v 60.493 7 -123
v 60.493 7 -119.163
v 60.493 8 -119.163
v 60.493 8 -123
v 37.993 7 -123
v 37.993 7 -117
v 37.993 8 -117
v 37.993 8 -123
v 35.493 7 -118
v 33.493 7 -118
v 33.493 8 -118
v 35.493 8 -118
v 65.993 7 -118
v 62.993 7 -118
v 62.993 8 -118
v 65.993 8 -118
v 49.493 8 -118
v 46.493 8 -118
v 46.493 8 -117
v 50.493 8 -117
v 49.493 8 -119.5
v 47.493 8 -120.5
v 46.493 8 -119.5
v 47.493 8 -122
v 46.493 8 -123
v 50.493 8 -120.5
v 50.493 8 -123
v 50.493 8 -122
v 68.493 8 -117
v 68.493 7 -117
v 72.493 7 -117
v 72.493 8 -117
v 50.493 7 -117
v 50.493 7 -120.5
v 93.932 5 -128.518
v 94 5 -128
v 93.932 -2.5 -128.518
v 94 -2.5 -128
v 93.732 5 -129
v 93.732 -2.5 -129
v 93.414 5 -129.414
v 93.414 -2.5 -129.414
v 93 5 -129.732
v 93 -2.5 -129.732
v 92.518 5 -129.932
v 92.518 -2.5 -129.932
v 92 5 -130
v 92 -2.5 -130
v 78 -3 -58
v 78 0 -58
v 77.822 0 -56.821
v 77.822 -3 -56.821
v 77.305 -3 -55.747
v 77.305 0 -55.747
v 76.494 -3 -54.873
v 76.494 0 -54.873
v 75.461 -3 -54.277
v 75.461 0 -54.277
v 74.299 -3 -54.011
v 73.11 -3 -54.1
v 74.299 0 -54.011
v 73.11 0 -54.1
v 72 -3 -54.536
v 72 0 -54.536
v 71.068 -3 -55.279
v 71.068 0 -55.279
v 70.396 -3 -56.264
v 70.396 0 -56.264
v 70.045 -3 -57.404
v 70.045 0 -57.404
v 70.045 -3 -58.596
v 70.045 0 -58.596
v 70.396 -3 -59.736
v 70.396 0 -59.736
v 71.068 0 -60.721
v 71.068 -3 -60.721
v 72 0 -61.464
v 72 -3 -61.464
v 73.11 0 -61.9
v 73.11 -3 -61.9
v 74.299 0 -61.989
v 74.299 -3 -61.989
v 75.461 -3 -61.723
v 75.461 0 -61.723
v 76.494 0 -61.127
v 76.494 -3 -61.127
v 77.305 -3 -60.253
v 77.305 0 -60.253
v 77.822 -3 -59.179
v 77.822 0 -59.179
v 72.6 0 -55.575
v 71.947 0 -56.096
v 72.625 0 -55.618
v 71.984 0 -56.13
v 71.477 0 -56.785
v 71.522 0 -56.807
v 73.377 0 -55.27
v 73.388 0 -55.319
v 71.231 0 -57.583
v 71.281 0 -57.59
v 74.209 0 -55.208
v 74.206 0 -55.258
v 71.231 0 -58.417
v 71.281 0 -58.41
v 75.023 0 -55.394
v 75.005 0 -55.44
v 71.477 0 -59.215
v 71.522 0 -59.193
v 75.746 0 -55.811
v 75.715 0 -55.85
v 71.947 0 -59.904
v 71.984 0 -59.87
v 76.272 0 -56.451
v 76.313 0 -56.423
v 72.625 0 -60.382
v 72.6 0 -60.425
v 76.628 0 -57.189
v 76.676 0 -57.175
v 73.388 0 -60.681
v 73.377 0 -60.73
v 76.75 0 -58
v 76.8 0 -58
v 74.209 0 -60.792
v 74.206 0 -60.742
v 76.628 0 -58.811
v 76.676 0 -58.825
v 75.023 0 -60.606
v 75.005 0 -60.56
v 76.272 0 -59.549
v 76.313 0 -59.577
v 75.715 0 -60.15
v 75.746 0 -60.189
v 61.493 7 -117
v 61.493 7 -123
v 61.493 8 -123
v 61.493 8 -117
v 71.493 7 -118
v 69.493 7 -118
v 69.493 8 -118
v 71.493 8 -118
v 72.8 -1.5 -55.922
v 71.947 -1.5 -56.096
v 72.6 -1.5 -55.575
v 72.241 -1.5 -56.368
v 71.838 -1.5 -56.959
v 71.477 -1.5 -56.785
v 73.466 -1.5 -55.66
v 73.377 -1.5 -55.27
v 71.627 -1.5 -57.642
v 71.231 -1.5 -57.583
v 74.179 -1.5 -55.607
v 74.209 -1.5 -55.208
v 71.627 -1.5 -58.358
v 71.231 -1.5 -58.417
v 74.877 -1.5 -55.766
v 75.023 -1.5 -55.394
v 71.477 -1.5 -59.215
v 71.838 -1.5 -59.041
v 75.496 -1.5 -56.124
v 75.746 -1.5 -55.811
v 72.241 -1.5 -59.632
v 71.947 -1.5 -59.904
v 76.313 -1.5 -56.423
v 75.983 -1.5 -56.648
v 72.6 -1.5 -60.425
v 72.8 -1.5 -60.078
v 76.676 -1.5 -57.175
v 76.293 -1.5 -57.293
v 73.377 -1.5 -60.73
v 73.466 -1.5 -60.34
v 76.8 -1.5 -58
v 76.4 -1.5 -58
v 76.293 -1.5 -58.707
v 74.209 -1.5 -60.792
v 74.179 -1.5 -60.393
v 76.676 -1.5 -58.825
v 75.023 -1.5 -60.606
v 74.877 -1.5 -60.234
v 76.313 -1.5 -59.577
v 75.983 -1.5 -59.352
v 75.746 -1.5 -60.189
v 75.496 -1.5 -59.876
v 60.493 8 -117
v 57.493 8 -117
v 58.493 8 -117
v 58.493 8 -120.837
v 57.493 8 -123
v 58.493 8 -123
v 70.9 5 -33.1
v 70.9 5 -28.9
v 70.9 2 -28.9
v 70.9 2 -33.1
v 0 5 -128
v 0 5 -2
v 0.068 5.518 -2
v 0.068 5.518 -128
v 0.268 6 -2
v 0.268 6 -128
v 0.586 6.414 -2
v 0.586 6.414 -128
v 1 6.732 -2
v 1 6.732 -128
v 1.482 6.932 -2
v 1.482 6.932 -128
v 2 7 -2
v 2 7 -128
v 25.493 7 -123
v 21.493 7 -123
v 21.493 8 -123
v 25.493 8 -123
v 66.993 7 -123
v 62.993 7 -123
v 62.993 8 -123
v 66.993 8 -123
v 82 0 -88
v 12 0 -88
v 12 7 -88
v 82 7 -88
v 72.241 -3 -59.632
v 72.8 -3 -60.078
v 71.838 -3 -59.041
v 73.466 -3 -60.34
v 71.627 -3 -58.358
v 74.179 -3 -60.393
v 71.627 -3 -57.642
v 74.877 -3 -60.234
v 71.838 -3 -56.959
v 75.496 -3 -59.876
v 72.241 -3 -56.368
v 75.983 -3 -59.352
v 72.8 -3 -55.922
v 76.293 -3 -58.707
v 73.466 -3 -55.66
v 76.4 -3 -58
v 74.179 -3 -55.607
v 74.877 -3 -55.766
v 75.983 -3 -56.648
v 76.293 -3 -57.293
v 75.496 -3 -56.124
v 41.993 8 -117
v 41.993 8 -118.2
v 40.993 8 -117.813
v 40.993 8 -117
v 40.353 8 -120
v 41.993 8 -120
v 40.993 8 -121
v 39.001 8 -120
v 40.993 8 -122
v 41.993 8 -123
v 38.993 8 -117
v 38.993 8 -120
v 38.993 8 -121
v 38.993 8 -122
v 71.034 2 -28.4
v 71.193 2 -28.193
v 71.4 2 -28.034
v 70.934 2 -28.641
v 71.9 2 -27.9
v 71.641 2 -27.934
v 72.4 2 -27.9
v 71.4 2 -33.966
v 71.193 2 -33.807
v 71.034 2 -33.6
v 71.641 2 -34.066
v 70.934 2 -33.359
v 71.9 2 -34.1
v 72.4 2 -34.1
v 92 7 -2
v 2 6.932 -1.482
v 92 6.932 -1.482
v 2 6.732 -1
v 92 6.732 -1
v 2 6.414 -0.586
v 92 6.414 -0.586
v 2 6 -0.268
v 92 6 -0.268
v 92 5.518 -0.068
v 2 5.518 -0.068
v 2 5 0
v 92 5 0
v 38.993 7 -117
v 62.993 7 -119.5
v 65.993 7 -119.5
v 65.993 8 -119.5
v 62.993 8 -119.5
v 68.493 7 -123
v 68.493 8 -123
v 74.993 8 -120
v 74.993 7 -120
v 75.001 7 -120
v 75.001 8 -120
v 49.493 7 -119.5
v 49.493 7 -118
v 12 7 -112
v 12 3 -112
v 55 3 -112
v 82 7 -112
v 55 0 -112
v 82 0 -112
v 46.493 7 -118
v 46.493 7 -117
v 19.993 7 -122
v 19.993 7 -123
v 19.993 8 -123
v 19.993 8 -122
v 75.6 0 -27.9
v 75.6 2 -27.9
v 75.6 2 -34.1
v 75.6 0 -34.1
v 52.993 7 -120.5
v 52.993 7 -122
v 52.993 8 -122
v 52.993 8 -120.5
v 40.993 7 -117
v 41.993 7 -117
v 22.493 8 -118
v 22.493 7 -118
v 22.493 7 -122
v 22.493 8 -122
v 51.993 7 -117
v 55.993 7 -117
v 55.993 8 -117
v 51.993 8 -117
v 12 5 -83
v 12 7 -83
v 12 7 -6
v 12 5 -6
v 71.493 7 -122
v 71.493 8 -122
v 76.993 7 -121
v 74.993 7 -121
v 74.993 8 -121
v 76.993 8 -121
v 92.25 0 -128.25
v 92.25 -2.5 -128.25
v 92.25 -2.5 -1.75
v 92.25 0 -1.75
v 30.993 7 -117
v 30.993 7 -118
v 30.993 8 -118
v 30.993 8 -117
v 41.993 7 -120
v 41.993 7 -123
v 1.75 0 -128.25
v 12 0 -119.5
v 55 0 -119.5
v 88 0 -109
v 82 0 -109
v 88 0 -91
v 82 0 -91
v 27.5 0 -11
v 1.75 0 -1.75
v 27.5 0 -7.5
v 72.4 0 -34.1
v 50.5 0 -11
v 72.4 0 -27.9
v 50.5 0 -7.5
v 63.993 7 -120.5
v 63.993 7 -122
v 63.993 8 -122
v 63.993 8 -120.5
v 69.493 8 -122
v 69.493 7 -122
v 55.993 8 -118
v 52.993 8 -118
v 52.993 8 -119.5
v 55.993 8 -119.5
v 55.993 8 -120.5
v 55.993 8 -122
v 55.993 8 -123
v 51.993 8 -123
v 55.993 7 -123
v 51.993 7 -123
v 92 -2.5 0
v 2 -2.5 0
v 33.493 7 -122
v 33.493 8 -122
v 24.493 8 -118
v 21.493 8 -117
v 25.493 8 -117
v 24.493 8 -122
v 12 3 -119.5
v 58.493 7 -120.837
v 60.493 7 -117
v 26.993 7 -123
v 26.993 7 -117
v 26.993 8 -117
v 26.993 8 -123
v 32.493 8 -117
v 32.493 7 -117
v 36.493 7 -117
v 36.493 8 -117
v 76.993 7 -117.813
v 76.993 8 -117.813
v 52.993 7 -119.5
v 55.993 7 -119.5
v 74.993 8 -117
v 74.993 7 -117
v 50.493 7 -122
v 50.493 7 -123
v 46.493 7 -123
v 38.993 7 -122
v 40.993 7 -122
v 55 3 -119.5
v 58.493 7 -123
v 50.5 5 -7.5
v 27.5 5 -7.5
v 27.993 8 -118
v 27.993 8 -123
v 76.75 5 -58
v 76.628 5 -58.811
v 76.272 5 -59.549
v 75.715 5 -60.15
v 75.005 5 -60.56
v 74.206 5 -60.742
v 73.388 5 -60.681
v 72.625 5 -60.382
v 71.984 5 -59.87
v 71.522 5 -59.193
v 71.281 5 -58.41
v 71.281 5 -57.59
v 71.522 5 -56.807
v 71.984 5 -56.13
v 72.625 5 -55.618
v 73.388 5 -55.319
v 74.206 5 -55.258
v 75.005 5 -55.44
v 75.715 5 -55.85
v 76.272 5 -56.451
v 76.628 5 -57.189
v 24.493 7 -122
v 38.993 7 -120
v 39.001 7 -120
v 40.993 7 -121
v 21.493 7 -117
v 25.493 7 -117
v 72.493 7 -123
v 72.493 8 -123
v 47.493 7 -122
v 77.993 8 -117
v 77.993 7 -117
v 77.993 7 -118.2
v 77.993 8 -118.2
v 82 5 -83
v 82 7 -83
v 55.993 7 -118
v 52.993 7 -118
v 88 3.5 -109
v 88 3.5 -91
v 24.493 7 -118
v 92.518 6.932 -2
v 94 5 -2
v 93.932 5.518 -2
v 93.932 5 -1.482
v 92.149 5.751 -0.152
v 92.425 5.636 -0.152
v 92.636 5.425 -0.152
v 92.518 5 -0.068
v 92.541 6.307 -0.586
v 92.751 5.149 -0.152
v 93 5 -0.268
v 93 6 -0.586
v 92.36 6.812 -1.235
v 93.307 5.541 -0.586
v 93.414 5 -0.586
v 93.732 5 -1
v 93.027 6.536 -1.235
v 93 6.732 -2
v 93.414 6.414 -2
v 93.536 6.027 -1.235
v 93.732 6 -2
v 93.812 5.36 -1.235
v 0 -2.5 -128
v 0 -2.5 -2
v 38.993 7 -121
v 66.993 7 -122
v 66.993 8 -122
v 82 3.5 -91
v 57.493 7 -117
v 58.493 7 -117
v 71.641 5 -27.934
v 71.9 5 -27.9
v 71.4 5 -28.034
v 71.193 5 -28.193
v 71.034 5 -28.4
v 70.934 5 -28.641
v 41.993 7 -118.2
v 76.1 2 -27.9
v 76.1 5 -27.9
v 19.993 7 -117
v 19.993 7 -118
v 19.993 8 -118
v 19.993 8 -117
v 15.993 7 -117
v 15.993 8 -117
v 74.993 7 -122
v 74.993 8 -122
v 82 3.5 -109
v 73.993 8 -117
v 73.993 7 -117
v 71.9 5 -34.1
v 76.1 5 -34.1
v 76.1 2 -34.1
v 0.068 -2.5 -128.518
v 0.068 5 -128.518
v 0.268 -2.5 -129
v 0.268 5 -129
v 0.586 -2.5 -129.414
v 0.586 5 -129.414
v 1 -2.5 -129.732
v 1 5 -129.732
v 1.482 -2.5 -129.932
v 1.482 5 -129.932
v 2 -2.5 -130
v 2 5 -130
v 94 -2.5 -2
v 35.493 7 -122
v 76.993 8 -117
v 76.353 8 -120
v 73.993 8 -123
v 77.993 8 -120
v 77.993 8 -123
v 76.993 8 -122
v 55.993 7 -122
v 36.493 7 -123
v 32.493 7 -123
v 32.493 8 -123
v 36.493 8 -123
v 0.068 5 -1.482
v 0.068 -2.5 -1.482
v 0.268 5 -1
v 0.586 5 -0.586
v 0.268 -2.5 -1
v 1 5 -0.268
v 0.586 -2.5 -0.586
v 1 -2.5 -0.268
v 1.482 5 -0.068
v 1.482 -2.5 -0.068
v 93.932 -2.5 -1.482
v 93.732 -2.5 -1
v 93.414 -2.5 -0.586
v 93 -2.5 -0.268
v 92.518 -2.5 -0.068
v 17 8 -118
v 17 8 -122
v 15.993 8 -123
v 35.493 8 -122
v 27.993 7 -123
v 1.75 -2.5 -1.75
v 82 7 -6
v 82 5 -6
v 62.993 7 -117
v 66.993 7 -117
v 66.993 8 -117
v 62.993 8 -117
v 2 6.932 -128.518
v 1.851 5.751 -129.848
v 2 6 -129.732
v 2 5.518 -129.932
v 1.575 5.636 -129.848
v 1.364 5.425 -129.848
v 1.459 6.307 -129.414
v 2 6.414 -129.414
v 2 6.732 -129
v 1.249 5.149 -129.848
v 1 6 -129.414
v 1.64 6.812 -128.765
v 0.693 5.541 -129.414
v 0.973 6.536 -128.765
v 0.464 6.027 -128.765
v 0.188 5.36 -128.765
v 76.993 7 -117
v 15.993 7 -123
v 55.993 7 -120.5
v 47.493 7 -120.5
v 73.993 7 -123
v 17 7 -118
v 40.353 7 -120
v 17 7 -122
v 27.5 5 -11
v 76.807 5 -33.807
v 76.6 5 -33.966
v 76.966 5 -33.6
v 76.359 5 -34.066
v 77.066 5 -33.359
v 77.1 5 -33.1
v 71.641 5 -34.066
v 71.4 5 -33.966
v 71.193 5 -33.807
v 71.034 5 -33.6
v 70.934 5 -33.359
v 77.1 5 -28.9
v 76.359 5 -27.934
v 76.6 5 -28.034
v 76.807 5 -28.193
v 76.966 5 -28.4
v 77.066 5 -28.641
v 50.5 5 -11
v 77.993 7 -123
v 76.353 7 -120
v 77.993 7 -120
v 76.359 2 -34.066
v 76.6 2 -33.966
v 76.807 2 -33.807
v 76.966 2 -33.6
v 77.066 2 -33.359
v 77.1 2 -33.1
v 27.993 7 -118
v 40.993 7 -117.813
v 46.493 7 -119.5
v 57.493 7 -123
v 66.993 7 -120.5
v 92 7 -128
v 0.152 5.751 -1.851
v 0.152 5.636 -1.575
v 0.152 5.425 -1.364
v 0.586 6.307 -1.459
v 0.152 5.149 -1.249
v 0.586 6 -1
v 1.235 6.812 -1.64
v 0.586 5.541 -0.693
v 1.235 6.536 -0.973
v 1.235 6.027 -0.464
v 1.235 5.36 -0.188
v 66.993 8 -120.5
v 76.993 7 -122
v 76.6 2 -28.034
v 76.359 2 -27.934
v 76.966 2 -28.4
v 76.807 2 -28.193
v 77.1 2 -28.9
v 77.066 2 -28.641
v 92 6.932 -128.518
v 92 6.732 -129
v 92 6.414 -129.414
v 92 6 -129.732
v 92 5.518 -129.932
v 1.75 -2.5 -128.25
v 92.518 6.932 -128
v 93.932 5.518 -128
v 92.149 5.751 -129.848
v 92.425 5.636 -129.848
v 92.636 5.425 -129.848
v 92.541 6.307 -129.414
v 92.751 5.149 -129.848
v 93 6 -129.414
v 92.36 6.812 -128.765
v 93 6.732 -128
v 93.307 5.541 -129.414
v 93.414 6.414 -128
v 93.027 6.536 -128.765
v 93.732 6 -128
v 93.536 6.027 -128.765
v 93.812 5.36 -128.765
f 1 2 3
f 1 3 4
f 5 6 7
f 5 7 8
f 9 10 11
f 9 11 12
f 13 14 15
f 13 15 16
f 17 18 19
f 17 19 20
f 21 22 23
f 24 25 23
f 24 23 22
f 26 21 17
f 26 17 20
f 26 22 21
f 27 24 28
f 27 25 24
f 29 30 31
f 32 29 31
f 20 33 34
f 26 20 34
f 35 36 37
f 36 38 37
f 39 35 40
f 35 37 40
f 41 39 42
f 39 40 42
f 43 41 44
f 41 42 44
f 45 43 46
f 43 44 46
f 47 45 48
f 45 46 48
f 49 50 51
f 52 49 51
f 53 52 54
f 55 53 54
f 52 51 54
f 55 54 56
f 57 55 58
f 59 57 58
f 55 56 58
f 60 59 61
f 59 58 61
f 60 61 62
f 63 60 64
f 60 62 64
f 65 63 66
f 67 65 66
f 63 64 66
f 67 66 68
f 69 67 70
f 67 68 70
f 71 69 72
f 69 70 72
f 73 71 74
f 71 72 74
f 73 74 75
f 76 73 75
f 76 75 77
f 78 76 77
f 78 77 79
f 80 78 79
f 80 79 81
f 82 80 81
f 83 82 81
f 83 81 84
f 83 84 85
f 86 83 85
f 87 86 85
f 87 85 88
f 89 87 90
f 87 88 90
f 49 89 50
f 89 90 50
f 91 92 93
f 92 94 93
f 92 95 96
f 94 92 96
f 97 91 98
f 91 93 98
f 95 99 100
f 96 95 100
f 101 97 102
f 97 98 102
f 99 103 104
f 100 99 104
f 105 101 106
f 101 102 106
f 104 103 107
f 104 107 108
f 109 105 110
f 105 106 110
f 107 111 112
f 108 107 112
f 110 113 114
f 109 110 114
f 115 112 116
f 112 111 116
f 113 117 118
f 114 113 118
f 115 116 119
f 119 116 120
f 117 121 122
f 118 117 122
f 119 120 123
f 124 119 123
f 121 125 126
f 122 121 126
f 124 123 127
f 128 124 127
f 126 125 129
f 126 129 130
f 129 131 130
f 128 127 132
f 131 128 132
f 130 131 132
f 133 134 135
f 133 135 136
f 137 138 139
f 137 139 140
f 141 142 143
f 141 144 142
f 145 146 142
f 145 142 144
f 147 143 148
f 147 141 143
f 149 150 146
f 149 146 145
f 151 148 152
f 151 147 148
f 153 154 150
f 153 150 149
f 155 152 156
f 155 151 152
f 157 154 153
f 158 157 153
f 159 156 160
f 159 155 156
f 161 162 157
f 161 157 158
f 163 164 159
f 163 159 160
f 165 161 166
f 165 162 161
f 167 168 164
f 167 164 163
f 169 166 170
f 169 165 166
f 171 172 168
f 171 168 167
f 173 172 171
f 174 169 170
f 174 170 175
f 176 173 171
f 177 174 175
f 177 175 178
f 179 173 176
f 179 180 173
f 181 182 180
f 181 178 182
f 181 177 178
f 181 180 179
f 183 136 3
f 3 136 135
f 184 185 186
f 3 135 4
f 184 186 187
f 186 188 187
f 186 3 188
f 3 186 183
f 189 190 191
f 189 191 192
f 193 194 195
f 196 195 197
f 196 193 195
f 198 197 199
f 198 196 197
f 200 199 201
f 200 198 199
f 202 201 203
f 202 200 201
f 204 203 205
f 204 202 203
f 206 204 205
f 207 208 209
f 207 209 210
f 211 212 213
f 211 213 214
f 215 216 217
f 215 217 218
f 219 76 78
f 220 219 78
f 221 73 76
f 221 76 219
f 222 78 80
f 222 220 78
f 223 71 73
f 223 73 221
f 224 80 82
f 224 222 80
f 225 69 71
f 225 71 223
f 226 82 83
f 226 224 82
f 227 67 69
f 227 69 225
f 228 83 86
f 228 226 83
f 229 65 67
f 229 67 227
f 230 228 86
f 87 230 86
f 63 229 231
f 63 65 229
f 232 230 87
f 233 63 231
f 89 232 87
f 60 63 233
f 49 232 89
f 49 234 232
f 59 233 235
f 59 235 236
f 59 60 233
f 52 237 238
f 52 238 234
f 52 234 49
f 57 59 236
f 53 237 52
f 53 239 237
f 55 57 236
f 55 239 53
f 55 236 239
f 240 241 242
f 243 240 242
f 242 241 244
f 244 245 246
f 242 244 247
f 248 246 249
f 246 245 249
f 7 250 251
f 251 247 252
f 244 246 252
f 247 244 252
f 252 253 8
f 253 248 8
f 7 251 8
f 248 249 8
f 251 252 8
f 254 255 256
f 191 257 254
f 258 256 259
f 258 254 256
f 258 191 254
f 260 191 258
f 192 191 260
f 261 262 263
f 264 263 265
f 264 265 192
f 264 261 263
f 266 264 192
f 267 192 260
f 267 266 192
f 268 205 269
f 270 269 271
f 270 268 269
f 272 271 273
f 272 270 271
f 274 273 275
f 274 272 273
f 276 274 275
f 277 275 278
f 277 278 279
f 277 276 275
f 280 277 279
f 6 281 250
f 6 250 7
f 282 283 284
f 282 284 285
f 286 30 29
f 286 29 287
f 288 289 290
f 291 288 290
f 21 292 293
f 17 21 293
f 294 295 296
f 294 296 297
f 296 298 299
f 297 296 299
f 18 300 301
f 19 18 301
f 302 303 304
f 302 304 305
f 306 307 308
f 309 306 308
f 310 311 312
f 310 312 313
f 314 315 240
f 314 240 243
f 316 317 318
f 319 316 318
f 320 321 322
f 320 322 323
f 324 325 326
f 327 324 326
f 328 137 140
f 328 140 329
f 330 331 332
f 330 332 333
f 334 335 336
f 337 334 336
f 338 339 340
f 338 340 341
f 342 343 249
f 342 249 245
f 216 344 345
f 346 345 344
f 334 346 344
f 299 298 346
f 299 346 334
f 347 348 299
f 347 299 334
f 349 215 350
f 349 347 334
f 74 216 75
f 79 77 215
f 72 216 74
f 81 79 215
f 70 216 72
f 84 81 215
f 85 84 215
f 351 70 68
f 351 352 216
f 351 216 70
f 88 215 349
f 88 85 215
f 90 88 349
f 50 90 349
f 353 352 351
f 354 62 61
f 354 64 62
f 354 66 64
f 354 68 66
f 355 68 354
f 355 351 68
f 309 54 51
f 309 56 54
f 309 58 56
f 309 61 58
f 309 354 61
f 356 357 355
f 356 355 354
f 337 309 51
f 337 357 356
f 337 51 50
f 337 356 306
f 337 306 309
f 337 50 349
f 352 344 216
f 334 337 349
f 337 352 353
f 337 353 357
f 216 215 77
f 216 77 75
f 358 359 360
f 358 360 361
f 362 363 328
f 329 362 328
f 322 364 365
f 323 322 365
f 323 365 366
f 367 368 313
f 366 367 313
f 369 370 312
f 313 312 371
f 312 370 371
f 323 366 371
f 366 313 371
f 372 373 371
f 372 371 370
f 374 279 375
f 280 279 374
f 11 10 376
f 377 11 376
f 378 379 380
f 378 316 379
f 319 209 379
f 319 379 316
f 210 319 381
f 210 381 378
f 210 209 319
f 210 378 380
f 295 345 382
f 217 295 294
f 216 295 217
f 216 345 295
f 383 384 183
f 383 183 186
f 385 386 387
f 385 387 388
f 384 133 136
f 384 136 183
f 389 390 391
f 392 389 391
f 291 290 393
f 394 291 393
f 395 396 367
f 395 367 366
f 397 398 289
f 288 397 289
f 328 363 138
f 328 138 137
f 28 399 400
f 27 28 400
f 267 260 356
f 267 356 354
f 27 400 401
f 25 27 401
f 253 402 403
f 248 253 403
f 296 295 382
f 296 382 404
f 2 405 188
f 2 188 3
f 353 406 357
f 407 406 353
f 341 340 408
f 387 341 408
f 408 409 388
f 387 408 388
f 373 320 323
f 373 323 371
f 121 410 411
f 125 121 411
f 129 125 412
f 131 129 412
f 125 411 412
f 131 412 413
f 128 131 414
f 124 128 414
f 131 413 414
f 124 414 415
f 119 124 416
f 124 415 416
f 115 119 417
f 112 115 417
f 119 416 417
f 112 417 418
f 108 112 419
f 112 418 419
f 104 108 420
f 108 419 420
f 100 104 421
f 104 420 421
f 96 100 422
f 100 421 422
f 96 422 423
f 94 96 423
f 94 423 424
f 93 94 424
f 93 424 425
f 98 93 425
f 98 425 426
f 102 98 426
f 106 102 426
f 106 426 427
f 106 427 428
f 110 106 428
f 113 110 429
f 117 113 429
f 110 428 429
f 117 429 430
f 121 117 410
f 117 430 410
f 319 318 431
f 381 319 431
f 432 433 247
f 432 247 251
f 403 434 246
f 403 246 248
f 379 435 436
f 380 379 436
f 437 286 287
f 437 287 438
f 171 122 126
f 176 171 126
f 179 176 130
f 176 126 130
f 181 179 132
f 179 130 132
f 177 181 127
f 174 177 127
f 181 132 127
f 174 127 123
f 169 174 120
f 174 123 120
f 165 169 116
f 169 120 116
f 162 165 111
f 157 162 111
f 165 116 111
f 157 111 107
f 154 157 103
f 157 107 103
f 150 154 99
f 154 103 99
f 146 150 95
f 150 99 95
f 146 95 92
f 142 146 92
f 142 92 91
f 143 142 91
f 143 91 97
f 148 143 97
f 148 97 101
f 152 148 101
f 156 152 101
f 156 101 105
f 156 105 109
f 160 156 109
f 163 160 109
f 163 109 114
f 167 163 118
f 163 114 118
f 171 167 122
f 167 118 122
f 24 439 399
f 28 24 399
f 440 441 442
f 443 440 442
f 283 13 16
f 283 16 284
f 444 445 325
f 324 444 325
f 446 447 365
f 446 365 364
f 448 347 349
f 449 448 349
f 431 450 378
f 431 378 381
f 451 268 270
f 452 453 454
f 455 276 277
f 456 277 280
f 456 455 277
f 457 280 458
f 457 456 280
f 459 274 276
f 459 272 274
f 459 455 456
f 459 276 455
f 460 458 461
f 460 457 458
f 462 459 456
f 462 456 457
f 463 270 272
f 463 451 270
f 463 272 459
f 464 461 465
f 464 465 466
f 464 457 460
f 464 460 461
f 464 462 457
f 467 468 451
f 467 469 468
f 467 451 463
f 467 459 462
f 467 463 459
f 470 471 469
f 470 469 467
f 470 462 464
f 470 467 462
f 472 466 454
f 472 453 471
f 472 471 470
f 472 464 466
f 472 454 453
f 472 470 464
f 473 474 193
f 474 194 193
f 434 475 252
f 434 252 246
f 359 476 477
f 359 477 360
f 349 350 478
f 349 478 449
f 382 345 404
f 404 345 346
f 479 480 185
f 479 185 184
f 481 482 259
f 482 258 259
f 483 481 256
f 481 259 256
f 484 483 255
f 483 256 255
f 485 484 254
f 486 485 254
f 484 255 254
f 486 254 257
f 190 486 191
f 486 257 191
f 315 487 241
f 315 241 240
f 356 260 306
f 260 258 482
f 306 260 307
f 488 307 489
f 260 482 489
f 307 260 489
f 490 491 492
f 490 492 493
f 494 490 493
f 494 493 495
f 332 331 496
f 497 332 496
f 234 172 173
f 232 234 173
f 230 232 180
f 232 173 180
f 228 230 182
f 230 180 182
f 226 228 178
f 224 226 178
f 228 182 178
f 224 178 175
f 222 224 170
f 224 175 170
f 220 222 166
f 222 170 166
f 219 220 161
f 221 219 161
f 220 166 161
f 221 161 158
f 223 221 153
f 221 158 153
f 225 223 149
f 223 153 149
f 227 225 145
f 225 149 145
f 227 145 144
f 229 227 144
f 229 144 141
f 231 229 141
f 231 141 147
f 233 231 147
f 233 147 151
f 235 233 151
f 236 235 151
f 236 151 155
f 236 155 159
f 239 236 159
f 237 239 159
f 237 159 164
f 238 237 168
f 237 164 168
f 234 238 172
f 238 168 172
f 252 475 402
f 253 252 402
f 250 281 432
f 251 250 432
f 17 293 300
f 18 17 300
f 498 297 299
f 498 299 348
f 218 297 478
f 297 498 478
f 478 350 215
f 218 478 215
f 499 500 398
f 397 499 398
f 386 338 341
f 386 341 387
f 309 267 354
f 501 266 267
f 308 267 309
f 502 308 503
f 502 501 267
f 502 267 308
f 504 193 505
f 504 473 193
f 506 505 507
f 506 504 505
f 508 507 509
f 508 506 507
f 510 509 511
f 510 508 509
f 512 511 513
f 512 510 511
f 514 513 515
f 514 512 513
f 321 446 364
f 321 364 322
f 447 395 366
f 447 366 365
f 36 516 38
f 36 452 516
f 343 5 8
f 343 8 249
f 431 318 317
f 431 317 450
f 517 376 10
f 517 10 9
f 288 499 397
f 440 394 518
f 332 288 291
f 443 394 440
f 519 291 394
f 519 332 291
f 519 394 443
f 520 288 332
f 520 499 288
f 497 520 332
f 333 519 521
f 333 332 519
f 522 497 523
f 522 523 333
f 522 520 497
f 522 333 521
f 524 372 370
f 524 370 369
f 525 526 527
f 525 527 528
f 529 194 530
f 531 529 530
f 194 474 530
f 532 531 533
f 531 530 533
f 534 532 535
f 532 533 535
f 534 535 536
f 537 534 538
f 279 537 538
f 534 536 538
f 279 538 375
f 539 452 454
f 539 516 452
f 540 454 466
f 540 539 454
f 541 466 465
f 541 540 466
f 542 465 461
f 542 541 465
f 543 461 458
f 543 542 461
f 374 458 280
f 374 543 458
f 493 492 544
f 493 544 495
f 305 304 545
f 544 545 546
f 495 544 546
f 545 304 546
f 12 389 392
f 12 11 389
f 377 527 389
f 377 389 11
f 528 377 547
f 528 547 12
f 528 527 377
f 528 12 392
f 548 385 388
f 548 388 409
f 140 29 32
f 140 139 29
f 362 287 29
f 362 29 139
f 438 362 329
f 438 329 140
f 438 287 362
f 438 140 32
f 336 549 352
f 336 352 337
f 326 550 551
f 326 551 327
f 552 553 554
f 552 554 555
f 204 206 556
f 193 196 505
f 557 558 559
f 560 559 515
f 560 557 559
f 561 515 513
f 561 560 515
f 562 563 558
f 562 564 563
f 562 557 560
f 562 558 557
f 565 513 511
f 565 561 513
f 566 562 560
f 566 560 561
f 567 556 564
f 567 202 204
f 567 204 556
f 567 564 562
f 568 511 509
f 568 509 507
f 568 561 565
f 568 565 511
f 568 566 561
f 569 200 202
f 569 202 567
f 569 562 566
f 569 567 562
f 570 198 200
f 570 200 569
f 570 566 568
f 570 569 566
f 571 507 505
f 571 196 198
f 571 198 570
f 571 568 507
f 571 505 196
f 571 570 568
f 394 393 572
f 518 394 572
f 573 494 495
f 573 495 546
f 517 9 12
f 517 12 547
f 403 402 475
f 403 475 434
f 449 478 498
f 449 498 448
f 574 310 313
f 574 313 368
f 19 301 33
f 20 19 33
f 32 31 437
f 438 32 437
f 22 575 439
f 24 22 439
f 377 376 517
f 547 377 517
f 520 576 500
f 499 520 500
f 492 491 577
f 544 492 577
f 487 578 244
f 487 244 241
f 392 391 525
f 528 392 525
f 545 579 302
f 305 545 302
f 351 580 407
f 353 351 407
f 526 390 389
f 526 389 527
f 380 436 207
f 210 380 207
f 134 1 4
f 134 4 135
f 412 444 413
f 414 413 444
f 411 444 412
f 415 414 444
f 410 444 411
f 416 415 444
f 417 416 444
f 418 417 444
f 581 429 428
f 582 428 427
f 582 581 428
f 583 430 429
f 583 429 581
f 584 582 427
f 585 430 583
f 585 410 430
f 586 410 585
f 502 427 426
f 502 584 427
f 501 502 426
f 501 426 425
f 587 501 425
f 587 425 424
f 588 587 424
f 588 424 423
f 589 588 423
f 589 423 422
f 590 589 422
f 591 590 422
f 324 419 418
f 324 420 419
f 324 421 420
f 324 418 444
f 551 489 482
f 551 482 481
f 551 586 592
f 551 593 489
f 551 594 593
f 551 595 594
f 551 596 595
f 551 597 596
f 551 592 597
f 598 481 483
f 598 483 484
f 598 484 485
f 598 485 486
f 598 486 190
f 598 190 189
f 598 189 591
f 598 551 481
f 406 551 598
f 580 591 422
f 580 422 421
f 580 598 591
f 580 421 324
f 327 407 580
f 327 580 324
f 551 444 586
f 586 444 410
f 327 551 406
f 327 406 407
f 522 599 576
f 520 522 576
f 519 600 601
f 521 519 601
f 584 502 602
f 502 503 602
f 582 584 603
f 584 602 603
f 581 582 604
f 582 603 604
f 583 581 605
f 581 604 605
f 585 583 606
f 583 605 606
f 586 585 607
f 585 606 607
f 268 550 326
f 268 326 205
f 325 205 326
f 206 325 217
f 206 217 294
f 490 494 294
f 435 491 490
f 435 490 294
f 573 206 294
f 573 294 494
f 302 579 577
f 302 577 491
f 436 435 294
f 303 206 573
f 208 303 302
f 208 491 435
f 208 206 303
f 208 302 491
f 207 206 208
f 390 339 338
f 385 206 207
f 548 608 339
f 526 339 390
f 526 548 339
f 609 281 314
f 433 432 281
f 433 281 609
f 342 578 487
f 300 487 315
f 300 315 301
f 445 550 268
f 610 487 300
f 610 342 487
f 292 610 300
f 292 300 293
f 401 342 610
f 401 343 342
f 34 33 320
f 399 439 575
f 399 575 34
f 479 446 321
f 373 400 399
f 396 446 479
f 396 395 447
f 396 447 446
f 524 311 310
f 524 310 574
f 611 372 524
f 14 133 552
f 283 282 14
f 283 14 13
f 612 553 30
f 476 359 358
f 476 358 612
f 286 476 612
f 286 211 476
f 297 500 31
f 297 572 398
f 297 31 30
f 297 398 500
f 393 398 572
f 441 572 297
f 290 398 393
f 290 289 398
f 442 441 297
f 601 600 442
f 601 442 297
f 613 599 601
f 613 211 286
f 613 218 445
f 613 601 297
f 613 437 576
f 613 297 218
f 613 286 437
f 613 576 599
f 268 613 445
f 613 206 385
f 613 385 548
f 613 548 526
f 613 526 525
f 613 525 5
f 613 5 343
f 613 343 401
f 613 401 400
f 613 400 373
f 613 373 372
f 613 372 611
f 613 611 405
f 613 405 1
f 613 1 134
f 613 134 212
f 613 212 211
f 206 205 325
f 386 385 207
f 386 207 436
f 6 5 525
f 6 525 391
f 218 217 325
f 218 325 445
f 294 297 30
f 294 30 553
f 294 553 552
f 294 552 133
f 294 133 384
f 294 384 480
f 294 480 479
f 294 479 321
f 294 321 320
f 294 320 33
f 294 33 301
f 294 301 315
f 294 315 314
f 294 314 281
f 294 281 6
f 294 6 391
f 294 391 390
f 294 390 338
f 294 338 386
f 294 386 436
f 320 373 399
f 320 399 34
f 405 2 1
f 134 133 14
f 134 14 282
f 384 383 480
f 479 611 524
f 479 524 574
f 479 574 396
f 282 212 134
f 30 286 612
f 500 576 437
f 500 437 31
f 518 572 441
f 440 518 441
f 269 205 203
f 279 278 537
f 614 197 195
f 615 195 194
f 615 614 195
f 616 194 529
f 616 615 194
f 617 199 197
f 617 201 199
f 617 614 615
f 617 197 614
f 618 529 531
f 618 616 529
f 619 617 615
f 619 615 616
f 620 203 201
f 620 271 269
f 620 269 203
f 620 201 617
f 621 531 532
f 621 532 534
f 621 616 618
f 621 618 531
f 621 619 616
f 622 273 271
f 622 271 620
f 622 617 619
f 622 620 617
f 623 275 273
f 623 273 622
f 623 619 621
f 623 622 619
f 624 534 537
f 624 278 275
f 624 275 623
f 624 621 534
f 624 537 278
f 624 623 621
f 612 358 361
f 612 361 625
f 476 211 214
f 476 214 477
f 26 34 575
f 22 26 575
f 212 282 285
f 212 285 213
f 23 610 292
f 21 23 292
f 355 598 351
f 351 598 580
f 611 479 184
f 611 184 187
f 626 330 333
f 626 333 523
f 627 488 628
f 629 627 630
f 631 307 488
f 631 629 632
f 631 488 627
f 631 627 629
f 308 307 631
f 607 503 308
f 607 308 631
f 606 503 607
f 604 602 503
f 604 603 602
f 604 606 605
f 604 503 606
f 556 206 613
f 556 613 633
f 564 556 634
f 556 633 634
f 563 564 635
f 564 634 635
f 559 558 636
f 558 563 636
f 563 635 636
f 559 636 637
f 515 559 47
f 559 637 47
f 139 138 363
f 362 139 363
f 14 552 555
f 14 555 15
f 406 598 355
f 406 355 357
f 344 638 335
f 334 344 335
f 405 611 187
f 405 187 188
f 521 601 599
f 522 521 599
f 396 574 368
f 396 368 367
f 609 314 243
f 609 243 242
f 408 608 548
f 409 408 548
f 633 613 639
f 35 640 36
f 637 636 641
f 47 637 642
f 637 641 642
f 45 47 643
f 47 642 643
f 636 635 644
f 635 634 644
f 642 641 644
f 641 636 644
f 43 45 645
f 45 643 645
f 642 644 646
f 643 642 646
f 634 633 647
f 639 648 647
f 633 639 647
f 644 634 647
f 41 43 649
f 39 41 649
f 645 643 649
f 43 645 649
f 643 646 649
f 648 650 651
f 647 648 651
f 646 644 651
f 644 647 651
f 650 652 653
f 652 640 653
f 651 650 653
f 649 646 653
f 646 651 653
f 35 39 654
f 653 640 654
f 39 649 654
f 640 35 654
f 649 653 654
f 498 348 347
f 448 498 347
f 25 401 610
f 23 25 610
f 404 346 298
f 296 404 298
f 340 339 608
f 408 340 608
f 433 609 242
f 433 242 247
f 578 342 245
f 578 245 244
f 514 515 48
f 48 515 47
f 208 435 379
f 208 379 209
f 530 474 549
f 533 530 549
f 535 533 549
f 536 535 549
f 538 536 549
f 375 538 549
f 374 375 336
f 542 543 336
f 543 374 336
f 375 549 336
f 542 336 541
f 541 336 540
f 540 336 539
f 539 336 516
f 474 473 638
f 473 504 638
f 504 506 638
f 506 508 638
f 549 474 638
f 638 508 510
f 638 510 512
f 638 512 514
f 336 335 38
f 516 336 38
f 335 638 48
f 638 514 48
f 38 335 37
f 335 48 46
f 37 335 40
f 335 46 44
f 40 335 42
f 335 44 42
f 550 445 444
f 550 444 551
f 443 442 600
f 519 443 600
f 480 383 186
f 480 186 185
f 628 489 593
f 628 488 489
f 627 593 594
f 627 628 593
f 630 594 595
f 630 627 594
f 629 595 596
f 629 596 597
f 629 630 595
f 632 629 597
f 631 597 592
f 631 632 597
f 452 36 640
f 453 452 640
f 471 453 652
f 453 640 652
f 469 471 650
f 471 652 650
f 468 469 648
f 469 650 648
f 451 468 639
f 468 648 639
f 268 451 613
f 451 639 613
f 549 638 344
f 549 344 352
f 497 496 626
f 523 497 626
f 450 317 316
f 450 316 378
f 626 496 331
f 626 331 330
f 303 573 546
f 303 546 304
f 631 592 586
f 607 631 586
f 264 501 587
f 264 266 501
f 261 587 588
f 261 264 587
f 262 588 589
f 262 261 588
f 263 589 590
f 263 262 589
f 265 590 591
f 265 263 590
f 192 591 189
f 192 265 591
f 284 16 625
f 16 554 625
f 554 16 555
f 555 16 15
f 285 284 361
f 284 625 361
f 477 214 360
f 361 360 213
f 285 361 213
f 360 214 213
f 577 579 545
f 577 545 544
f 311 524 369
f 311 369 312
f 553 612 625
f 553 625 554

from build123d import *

# Parameters (mm, degrees)
SKETCH1_W                = 94
SKETCH1_H                = 130
BOSS_EXTRUDE1_DEPTH      = 9.5
SKETCH2_W                = 90.5
SKETCH2_H                = 126.5
CUT_EXTRUDE1_DEPTH       = 2.5
SKETCH3_W                = 70
SKETCH3_H                = 24
CUT_EXTRUDE2_DEPTH       = 8
SKETCH4_W                = 70
SKETCH4_H                = 77
CUT_EXTRUDE3_DEPTH       = 2
SKETCH5_W                = 23
SKETCH5_H                = 3.5
CUT_EXTRUDE4_DEPTH       = 8.5
SKETCH6_W                = 6
SKETCH6_H                = 18
CUT_EXTRUDE5_DEPTH       = 3.5
SKETCH7_W                = 43
SKETCH7_H                = 7.5
CUT_EXTRUDE6_DEPTH       = 3
FILLET1_R                = 2
SKETCH9_R                = 2.75
CUT_EXTRUDE7_DEPTH       = 5
SKETCH12_W               = 6.2
SKETCH12_H               = 6.2
CUT_EXTRUDE9_DEPTH       = 3
SKETCH13_W               = 3.2
SKETCH13_H               = 6.2
CUT_EXTRUDE10_DEPTH      = 6
CUT_EXTRUDE10_DEPTH_BACK = 5.5
FILLET2_R                = 1
SKETCH14_R               = 4
BOSS_EXTRUDE2_DEPTH      = 3
SKETCH15_R               = 2.8
CUT_EXTRUDE11_DEPTH      = 1.5
SKETCH16_R               = 2.4
CUT_EXTRUDE12_DEPTH      = 1.5
SKETCH18_W               = 4
SKETCH18_H               = 6
SKETCH18_W_2             = 2
SKETCH18_H_2             = 4
SKETCH18_H_3             = 1
BOSS_EXTRUDE3_DEPTH      = 1


with BuildPart() as part:
    # Sketch1 → Boss-Extrude1 (new body)
    with BuildSketch(Plane(origin=(0, 7, 0), x_dir=(1, 0, 0), z_dir=(0, 1, 0))):
        with Locations((47, 65)):
            Rectangle(SKETCH1_W, SKETCH1_H)
    extrude(amount=-BOSS_EXTRUDE1_DEPTH)

    # Sketch2 → Cut-Extrude1 (cut)
    with BuildSketch(Plane.XZ.offset(2.5)):
        with Locations((47, -65)):
            Rectangle(SKETCH2_W, SKETCH2_H)
    extrude(amount=-CUT_EXTRUDE1_DEPTH, mode=Mode.SUBTRACT)

    # Sketch3 → Cut-Extrude2 (cut, through all)
    with BuildSketch(Plane.XZ):
        with Locations((47, -100)):
            Rectangle(SKETCH3_W, SKETCH3_H)
    extrude(amount=-CUT_EXTRUDE2_DEPTH, mode=Mode.SUBTRACT)

    # Sketch4 → Cut-Extrude3 (cut)
    with BuildSketch(Plane(origin=(0, 7, 0), x_dir=(-1, 0, 0), z_dir=(0, 1, 0))):
        with Locations((-47, -44.5)):
            Rectangle(SKETCH4_W, SKETCH4_H)
    extrude(amount=-CUT_EXTRUDE3_DEPTH, mode=Mode.SUBTRACT)

    # Sketch5 → Cut-Extrude4 (cut, through all)
    with BuildSketch(Plane(origin=(0, 5, 0), x_dir=(-1, 0, 0), z_dir=(0, 1, 0))):
        with Locations((-39, -9.25)):
            Rectangle(SKETCH5_W, SKETCH5_H)
    extrude(amount=-CUT_EXTRUDE4_DEPTH, mode=Mode.SUBTRACT)

    # Sketch6 → Cut-Extrude5 (cut)
    with BuildSketch(Plane.XZ):
        with Locations((85, -100)):
            Rectangle(SKETCH6_W, SKETCH6_H)
    extrude(amount=-CUT_EXTRUDE5_DEPTH, mode=Mode.SUBTRACT)

    # Sketch7 → Cut-Extrude6 (cut)
    with BuildSketch(Plane.XZ):
        with Locations((33.5, -115.75)):
            Rectangle(SKETCH7_W, SKETCH7_H)
    extrude(amount=-CUT_EXTRUDE6_DEPTH, mode=Mode.SUBTRACT)

    # Fillet1
    fillet1_edges = [part.edges().sort_by_distance(p)[0] for p in [
        (94, 7, -65),
        (47, 7, 0),
        (0, 7, -65),
        (47, 7, -130),
        (94, 2.25, -130),
        (94, 2.25, 0),
        (0, 2.25, 0),
        (0, 2.25, -130),
    ]]
    fillet(fillet1_edges, radius=FILLET1_R)

    # Sketch9 → Cut-Extrude7 (cut)
    with BuildSketch(Plane(origin=(0, 5, 0), x_dir=(1, 0, 0), z_dir=(0, 1, 0))):
        with Locations((74, 58)):
            Circle(SKETCH9_R)
    extrude(amount=-CUT_EXTRUDE7_DEPTH, mode=Mode.SUBTRACT)

    # Sketch12 → Cut-Extrude9 (cut)
    with BuildSketch(Plane(origin=(0, 5, 0), x_dir=(1, 0, 0), z_dir=(0, 1, 0))):
        with Locations((74, 31)):
            Rectangle(SKETCH12_W, SKETCH12_H)
    extrude(amount=-CUT_EXTRUDE9_DEPTH, mode=Mode.SUBTRACT)

    # Sketch13 → Cut-Extrude10 (cut, two sides)
    with BuildSketch(Plane(origin=(0, 2, 0), x_dir=(1, 0, 0), z_dir=(0, 1, 0))) as cut_extrude10_sk:
        with Locations((74, 31)):
            Rectangle(SKETCH13_W, SKETCH13_H)
    extrude(amount=CUT_EXTRUDE10_DEPTH, mode=Mode.SUBTRACT)
    extrude(cut_extrude10_sk.sketch, amount=-CUT_EXTRUDE10_DEPTH_BACK, mode=Mode.SUBTRACT)

    # Fillet2
    fillet2_edges = [part.edges().sort_by_distance(p)[0] for p in [
        (77.1, 3.5, -34.1),
        (77.1, 3.5, -27.9),
        (70.9, 3.5, -27.9),
        (70.9, 3.5, -34.1),
    ]]
    fillet(fillet2_edges, radius=FILLET2_R)

    # Sketch14 → Boss-Extrude2 (add)
    with BuildSketch(Plane.XZ):
        with Locations((74, -58)):
            Circle(SKETCH14_R)
    extrude(amount=BOSS_EXTRUDE2_DEPTH)

    # Sketch15 → Cut-Extrude11 (cut)
    with BuildSketch(Plane(origin=(0, 0, 0), x_dir=(1, 0, 0), z_dir=(0, 1, 0))):
        with Locations((74, 58)):
            Circle(SKETCH15_R)
    extrude(amount=-CUT_EXTRUDE11_DEPTH, mode=Mode.SUBTRACT)

    # Sketch16 → Cut-Extrude12 (cut)
    with BuildSketch(Plane(origin=(0, -1.5, 0), x_dir=(1, 0, 0), z_dir=(0, 1, 0))):
        with Locations((74, 58)):
            Circle(SKETCH16_R)
    extrude(amount=-CUT_EXTRUDE12_DEPTH, mode=Mode.SUBTRACT)

    # Sketch18 → Boss-Extrude3 (add)
    with BuildSketch(Plane(origin=(0, 7, 0), x_dir=(1, 0, 0), z_dir=(0, 1, 0))):
        Polygon((17, 122), (17, 118), (19, 118), (19.993343468, 118), (19.993343468, 117), (15.993343468, 117), (15.993343468, 123), (19.993343468, 123), (19.993343468, 122), (19, 122), align=None)
        Polygon((66.993343468, 122), (63.993343468, 122), (63.993343468, 120.5), (66.993343468, 120.5), (66.993343468, 117), (62.993343468, 117), (62.993343468, 118), (65.993343468, 118), (65.993343468, 119.5), (62.993343468, 119.5), (62.993343468, 123), (66.993343468, 123), align=None)
        with Locations((23.493343468, 120)):
            Rectangle(SKETCH18_W, SKETCH18_H)
        with Locations((23.493343468, 120)):
            Rectangle(SKETCH18_W_2, SKETCH18_H_2, mode=Mode.SUBTRACT)
        Polygon((27.993343468, 122), (27.993343468, 118), (29.109404955, 118), (30.993343468, 118), (30.993343468, 117), (26.993343468, 117), (26.993343468, 123), (27.993343468, 123), align=None)
        with Locations((34.493343468, 120)):
            Rectangle(SKETCH18_W, SKETCH18_H)
        with Locations((34.493343468, 120)):
            Rectangle(SKETCH18_W_2, SKETCH18_H_2, mode=Mode.SUBTRACT)
        Polygon((49.493343468, 122), (50.493343468, 122), (50.493343468, 123), (46.493343468, 123), (46.493343468, 119.5), (47.493343468, 119.5), (49.493343468, 119.5), (49.493343468, 118), (47.956084084, 118), (46.493343468, 118), (46.493343468, 117), (50.493343468, 117), (50.493343468, 120.5), (49.493343468, 120.5), (47.493343468, 120.5), (47.493343468, 122), align=None)
        Polygon((37.993343468, 123), (41.993343468, 123), (41.993343468, 120), (40.353343468, 120), (41.993343468, 118.2), (41.993343468, 117), (40.993343468, 117), (40.993343468, 117.812757926), (39.000522912, 120), (38.993343468, 120), (38.993343468, 118.442496016), (38.993343468, 117), (37.993343468, 117), align=None)
        with Locations((39.993343468, 121.5)):
            Rectangle(SKETCH18_W_2, SKETCH18_H_3, mode=Mode.SUBTRACT)
        Polygon((55.993343468, 122), (52.993343468, 122), (52.993343468, 120.5), (55.993343468, 120.5), (55.993343468, 119.5), (52.993343468, 119.5), (52.993343468, 118), (55.993343468, 118), (55.993343468, 117), (51.993343468, 117), (51.993343468, 123), (55.993343468, 123), align=None)
        Polygon((58.493343468, 123), (60.493343468, 119.163331999), (60.493343468, 123), (61.493343468, 123), (61.493343468, 117), (60.493343468, 117), (58.493343468, 120.836668001), (58.493343468, 117), (57.493343468, 117), (57.493343468, 123), align=None)
        with Locations((70.493343468, 120)):
            Rectangle(SKETCH18_W, SKETCH18_H)
        with Locations((70.493343468, 120)):
            Rectangle(SKETCH18_W_2, SKETCH18_H_2, mode=Mode.SUBTRACT)
        Polygon((74.993343468, 117), (74.993343468, 120), (75.000522912, 120), (76.993343468, 117.812757926), (76.993343468, 117), (77.993343468, 117), (77.993343468, 118.2), (76.353343468, 120), (77.993343468, 120), (77.993343468, 123), (73.993343468, 123), (73.993343468, 117), align=None)
        with Locations((75.993343468, 121.5)):
            Rectangle(SKETCH18_W_2, SKETCH18_H_3, mode=Mode.SUBTRACT)
    extrude(amount=BOSS_EXTRUDE3_DEPTH)


solid = part.part
